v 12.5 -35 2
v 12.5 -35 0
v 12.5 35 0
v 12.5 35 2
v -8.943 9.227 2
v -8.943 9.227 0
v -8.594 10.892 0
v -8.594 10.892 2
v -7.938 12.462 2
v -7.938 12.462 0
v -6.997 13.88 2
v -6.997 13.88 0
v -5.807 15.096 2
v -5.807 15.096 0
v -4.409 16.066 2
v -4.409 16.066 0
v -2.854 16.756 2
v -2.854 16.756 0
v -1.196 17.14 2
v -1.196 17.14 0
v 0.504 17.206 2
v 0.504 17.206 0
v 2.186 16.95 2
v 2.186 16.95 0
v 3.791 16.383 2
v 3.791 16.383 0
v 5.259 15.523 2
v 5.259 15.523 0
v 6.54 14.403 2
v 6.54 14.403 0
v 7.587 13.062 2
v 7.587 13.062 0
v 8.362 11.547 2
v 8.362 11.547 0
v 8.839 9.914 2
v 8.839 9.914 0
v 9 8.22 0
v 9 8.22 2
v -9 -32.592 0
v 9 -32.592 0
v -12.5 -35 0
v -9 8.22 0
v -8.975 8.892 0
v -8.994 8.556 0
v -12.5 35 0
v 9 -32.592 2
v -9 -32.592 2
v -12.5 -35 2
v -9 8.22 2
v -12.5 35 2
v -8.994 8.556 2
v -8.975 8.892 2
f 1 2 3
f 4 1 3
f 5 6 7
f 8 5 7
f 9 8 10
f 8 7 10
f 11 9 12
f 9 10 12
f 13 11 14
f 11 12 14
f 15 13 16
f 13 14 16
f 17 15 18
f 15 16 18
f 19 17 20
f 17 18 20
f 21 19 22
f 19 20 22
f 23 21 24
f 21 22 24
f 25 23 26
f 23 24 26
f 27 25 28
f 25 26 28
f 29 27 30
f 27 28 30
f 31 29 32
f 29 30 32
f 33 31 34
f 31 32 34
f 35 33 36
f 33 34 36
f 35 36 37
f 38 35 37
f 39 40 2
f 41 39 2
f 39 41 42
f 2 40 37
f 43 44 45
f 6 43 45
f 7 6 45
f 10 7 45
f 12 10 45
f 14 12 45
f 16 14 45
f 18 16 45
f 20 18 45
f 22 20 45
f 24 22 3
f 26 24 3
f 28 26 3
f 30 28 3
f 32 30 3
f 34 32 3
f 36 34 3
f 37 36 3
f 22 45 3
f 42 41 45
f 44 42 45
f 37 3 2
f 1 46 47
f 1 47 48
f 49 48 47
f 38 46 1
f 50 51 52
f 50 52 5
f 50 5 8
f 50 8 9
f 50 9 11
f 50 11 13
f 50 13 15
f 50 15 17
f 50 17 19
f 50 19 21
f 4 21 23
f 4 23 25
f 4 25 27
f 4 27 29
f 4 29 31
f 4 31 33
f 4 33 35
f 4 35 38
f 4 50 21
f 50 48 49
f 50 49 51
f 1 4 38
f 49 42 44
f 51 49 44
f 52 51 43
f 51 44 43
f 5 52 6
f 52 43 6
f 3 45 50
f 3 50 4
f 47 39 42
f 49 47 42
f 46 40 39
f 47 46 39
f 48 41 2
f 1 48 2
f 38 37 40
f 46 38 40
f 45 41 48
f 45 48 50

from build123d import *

# Parameters (mm, degrees)
F0_W     = 25
F0_H     = 70
F1_DEPTH = 2


with BuildPart() as f1:
    # F0 (on Top) → F1 (new body)
    with BuildSketch(Plane.XY):
        Rectangle(F0_W, F0_H)
        with BuildLine():
            Line((9, -32.591704), (-9, -32.591704))
            Line((-9, -32.591704), (-9, 8.219976))
            ThreePointArc((-9, 8.219976), (-8.985863, 8.724219), (-8.943498, 9.226878))
            ThreePointArc((-8.943498, 9.226878), (0.504243, 17.20584), (9, 8.219976))
            Line((9, 8.219976), (9, -32.591704))
        make_face(mode=Mode.SUBTRACT)
    extrude(amount=F1_DEPTH)


solid = f1.part
